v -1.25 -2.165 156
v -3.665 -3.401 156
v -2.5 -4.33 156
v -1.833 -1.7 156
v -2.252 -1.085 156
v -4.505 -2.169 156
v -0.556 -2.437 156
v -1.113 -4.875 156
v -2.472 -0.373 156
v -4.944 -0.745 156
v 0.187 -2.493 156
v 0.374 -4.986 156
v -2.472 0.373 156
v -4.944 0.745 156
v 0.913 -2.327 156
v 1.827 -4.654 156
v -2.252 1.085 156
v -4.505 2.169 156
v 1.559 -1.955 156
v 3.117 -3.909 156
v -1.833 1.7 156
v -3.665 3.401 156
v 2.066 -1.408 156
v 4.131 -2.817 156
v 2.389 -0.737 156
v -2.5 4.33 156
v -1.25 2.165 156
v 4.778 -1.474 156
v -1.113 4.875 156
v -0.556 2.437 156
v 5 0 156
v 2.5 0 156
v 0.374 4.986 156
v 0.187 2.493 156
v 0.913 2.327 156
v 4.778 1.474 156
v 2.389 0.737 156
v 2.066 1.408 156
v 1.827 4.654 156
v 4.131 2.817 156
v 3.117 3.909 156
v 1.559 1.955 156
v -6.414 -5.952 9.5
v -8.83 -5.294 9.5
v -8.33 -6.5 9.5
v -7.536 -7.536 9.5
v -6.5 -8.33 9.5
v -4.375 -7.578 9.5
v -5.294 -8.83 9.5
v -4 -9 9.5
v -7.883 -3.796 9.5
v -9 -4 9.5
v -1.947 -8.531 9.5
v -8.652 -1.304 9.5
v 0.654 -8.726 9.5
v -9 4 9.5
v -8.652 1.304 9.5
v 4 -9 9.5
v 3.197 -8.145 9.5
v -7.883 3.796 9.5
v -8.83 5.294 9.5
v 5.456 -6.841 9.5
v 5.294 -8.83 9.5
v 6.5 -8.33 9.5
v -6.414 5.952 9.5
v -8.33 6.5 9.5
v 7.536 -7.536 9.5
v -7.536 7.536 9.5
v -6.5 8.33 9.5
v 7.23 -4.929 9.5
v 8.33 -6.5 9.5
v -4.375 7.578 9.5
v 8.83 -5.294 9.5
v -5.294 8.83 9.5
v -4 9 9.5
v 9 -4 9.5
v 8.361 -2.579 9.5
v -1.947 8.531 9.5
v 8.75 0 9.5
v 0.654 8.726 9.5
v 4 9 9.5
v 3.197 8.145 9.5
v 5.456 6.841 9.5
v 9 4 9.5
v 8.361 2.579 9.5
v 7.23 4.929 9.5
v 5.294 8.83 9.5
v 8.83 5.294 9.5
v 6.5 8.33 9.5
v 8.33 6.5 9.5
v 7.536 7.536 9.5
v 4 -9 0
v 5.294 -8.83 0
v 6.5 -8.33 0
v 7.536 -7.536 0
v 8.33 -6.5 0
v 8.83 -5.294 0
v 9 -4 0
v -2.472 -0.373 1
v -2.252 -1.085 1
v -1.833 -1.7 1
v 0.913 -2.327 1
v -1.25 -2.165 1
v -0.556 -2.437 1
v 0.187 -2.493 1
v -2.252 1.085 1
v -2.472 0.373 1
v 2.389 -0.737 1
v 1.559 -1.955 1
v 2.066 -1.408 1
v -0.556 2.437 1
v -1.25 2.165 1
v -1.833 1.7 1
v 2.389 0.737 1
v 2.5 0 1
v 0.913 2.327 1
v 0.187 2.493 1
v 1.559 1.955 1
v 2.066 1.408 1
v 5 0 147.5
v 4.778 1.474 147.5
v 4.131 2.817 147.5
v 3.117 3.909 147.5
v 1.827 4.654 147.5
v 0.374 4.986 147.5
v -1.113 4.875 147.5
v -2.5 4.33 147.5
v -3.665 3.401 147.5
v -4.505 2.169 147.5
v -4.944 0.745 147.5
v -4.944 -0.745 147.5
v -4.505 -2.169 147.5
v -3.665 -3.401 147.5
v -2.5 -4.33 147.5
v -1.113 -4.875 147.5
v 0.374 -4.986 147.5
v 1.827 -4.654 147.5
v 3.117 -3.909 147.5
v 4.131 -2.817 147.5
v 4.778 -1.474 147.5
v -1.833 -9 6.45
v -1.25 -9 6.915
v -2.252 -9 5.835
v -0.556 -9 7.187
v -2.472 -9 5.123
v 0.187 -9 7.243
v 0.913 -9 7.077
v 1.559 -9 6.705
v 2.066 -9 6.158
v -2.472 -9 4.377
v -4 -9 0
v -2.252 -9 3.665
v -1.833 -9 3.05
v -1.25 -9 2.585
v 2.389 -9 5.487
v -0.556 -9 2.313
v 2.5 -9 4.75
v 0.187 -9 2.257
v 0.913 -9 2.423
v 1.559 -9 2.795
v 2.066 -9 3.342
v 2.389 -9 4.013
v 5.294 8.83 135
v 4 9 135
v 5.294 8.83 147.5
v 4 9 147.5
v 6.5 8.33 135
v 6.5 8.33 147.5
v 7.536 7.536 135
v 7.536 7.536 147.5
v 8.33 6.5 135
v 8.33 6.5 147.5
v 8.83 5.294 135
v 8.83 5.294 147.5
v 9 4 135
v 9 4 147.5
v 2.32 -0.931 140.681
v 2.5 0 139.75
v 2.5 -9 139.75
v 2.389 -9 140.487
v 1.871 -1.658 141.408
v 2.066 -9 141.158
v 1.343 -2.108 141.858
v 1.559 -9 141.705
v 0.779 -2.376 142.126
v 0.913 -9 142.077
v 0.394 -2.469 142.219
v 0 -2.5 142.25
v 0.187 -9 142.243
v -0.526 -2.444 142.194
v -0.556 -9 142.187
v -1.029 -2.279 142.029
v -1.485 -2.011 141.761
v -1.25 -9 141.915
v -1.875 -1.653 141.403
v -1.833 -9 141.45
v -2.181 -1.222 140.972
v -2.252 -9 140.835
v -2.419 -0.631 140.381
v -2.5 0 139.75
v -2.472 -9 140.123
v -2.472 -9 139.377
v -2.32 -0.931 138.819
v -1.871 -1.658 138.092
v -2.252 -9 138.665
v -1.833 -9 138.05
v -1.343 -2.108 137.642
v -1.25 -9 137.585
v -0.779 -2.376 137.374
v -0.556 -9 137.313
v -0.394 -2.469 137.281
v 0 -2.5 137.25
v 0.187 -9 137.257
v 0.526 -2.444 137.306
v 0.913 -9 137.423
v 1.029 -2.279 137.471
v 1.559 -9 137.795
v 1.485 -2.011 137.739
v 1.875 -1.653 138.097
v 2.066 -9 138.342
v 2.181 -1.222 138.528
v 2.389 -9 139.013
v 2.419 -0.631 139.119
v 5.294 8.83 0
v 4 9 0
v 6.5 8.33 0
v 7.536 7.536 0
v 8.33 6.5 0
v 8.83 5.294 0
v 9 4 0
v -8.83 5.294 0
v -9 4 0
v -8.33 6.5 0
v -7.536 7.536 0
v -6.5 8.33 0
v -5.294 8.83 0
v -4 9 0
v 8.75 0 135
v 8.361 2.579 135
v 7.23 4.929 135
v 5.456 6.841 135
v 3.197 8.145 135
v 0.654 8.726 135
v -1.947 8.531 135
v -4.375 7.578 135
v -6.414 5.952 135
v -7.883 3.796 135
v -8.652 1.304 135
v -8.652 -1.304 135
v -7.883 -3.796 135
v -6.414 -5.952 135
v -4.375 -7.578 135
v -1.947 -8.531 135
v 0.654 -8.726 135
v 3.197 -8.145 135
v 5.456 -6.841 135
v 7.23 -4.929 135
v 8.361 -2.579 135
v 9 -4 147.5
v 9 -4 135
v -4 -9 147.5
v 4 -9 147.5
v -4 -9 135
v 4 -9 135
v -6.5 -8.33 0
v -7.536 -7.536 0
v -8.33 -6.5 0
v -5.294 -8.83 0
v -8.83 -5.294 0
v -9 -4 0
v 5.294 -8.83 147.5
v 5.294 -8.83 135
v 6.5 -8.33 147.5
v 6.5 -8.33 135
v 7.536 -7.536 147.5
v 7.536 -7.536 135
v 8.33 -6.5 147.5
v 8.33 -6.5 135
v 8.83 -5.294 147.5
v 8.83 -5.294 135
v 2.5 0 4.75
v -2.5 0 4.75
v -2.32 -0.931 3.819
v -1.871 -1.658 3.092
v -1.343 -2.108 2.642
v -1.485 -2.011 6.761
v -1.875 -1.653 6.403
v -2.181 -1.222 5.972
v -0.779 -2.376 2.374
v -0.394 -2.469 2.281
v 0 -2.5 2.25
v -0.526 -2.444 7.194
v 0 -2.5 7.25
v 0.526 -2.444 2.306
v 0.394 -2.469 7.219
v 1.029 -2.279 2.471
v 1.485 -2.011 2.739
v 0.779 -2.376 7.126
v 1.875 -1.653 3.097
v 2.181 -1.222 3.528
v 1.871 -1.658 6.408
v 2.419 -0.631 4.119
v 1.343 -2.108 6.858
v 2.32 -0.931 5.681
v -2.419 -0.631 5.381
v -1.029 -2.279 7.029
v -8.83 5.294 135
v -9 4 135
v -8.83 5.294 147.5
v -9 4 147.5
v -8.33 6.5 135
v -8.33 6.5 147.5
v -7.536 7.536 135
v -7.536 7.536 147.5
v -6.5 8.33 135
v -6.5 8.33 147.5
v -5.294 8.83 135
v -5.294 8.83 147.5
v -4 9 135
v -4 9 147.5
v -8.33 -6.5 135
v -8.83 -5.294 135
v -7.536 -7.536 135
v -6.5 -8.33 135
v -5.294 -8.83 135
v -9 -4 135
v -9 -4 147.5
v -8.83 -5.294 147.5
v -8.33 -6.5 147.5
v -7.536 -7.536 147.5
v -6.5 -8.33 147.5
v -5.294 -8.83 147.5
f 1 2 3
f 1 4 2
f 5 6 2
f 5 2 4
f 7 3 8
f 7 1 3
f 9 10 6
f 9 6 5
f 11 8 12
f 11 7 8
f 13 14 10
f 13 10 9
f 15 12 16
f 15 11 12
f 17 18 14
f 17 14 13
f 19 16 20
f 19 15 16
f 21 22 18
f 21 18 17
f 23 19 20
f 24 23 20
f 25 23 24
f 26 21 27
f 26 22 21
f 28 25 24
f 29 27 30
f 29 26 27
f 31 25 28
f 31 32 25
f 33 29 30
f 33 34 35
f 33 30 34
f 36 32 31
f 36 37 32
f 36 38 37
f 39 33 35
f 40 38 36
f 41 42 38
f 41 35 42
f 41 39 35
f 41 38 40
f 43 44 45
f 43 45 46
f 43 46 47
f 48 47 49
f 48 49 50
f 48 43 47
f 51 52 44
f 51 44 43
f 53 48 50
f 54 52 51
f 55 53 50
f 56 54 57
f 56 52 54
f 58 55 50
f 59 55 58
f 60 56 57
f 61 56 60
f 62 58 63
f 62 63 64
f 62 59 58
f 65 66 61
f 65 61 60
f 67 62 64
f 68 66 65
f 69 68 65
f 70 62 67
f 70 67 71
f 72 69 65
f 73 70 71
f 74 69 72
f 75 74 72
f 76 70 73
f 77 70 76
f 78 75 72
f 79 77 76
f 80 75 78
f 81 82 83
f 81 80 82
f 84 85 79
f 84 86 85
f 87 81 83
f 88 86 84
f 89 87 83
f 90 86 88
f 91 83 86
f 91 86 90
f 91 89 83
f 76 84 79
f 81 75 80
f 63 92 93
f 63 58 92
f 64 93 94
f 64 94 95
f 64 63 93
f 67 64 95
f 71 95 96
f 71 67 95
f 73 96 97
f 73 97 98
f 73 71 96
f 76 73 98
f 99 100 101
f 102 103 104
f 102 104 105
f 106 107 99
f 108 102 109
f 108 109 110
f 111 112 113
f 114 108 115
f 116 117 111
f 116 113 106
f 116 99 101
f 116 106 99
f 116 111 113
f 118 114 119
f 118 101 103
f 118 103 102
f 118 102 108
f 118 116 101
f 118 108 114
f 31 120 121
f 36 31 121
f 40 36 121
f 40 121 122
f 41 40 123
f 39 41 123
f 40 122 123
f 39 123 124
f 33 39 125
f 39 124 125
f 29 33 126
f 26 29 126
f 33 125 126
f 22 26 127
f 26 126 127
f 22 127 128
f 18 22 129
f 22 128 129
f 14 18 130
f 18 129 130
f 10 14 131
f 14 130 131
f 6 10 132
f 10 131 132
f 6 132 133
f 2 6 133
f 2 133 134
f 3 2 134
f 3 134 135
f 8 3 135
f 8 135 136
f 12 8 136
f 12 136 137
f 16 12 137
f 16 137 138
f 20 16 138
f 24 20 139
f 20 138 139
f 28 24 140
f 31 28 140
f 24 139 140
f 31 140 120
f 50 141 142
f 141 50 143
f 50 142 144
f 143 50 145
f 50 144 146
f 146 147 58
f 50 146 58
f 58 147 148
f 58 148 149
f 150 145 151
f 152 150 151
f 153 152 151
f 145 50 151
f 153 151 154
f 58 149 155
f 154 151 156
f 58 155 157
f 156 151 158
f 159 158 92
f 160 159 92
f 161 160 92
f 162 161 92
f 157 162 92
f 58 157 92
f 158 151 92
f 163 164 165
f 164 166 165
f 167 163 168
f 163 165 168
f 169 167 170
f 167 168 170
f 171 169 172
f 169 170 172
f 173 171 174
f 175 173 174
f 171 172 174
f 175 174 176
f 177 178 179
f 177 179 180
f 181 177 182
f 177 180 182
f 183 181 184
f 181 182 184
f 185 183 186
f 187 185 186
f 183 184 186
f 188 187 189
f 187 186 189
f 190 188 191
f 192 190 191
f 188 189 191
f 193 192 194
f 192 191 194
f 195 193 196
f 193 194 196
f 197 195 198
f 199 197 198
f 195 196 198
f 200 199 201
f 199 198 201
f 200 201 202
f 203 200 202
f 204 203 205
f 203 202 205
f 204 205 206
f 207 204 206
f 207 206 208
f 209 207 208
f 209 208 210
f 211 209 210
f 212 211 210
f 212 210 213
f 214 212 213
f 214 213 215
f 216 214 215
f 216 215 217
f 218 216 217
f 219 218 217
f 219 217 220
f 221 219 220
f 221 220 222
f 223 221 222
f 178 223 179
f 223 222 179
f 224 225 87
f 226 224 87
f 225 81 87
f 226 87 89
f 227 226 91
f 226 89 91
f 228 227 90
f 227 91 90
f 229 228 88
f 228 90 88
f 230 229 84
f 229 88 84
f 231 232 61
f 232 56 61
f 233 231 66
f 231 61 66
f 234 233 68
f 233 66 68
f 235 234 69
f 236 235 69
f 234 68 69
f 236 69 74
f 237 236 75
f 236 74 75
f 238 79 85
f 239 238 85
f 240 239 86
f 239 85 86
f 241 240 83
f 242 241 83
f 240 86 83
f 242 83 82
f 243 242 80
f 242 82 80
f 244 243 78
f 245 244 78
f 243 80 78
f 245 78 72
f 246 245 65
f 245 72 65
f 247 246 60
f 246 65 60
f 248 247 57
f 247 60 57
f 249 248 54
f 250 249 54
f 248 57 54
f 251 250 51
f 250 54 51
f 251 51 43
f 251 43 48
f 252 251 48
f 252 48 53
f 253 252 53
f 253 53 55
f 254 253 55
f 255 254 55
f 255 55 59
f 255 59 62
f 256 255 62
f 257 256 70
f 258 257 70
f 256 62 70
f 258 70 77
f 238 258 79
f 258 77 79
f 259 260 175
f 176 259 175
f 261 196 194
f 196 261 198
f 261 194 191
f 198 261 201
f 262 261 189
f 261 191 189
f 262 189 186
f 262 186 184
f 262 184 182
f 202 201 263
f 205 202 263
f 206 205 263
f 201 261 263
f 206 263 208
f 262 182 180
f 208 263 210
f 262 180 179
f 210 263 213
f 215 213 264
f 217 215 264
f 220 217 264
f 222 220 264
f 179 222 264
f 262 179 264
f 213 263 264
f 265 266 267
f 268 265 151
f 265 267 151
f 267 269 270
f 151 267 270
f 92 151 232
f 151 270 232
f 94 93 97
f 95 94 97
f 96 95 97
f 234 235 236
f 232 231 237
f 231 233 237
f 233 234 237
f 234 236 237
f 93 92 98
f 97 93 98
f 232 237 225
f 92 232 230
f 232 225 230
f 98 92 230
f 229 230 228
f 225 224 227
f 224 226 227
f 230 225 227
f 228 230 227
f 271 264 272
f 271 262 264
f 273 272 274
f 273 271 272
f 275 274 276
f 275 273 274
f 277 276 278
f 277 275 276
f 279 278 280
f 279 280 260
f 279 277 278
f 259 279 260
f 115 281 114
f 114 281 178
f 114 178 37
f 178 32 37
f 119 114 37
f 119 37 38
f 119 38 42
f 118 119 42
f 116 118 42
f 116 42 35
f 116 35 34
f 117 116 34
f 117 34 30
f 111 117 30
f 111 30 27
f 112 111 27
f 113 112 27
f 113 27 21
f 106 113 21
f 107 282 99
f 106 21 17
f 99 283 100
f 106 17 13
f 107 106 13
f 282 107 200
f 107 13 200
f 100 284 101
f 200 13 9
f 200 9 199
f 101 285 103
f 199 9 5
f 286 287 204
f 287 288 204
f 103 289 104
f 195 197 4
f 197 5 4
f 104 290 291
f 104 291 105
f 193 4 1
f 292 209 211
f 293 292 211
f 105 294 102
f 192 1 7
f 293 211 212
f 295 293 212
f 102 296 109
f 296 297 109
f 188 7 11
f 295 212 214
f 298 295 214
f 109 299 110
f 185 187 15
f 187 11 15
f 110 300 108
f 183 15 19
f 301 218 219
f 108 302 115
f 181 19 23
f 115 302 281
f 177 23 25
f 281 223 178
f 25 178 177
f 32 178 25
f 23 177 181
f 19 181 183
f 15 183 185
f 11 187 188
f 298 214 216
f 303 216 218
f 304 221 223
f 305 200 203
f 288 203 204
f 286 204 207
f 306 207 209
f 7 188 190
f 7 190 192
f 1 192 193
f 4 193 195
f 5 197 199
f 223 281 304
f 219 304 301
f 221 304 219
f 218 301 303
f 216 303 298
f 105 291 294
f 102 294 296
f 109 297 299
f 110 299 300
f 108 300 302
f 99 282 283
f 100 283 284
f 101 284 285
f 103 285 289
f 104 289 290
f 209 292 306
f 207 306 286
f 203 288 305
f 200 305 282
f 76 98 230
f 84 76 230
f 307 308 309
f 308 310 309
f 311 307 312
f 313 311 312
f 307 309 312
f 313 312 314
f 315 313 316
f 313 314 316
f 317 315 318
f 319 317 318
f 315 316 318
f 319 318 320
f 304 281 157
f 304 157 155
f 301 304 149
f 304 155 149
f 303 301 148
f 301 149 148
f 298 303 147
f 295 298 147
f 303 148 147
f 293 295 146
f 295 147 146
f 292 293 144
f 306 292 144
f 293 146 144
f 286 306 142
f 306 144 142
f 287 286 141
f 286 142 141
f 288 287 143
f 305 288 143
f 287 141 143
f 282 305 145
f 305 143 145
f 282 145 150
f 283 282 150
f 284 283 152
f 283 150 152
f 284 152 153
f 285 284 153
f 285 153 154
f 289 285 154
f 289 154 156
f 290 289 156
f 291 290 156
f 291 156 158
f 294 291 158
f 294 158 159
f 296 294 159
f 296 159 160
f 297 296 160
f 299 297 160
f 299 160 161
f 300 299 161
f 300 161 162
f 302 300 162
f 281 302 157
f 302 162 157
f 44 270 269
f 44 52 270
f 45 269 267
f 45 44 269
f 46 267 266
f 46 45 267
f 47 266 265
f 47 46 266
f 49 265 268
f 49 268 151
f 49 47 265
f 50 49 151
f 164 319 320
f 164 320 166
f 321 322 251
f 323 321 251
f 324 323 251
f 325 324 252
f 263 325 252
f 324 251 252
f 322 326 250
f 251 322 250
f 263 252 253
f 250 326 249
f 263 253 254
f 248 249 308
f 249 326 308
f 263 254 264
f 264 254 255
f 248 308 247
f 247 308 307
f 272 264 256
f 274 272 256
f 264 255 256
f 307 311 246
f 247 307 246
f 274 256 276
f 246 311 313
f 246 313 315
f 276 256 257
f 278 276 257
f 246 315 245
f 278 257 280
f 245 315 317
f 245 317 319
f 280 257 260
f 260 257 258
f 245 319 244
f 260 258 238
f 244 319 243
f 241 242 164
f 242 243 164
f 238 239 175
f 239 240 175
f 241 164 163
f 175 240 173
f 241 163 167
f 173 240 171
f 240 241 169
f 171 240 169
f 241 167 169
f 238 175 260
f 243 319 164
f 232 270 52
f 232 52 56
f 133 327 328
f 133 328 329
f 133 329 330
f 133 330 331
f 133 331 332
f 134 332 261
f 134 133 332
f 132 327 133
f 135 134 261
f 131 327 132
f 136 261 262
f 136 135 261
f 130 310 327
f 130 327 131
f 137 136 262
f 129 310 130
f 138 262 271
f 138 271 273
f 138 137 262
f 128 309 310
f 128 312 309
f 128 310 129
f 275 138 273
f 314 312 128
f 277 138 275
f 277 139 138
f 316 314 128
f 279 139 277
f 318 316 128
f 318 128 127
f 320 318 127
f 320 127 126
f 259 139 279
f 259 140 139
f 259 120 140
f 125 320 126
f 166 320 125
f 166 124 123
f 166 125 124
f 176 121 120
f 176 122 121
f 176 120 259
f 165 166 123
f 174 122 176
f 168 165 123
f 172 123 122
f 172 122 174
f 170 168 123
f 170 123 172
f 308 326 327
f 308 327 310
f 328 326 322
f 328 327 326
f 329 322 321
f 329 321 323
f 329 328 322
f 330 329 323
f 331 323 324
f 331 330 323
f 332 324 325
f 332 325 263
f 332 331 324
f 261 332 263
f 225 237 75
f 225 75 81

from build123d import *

# Parameters (mm, degrees)
SKETCH_1_W          = 18
SKETCH_1_H          = 18
EXTRUDE_1_DEPTH     = 9.5
SKETCH_2_R          = 8.75
EXTRUDE_2_DEPTH     = 125.5
SKETCH_3_W          = 18
SKETCH_3_H          = 18
EXTRUDE_3_DEPTH     = 12.5
SKETCH_4_R          = 5
EXTRUDE_4_DEPTH     = 8.5
SKETCH_5_R          = 2.5
CUT_EXTRUDE_1_DEPTH = 155
FILLET_1_R          = 5
CUT_EXTRUDE_2_REACH = 20
SKETCH_6_R          = 2.5


with BuildPart() as part:
    # 草图1 → 凸台-拉伸1 (new body)
    with BuildSketch(Plane.XY):
        Rectangle(SKETCH_1_W, SKETCH_1_H)
    extrude(amount=EXTRUDE_1_DEPTH)

    # 草图2 → 凸台-拉伸2 (add)
    with BuildSketch(Plane.XY.offset(9.5)):
        Circle(SKETCH_2_R)
    extrude(amount=EXTRUDE_2_DEPTH)

    # 草图3 → 凸台-拉伸3 (add)
    with BuildSketch(Plane.XY.offset(135)):
        Rectangle(SKETCH_3_W, SKETCH_3_H)
    extrude(amount=EXTRUDE_3_DEPTH)

    # 草图4 → 凸台-拉伸4 (add)
    with BuildSketch(Plane.XY.offset(147.5)):
        Circle(SKETCH_4_R)
    extrude(amount=EXTRUDE_4_DEPTH)

    # 草图5 → 切除-拉伸1 (cut)
    with BuildSketch(Plane.XY.offset(156)):
        Circle(SKETCH_5_R)
    extrude(amount=-CUT_EXTRUDE_1_DEPTH, mode=Mode.SUBTRACT)

    # 圆角1
    fillet_1_edges = [part.edges().sort_by_distance(p)[0] for p in [
        (9, -9, 141.25),
        (9, 9, 141.25),
        (-9, 9, 141.25),
        (-9, -9, 141.25),
        (9, -9, 4.75),
        (-9, -9, 4.75),
        (-9, 9, 4.75),
        (9, 9, 4.75),
    ]]
    fillet(fillet_1_edges, radius=FILLET_1_R)

    # 草图6 → 切除-拉伸2 (cut, up to next)
    with BuildSketch(Plane.XZ.offset(9), mode=Mode.PRIVATE) as cut_extrude_2_sk1:
        with Locations((0, 4.75)):
            Circle(SKETCH_6_R)
    cut_extrude_2_tool1 = extrude(cut_extrude_2_sk1.sketch, amount=-CUT_EXTRUDE_2_REACH, mode=Mode.PRIVATE) & part.part
    add(cut_extrude_2_tool1.solids().sort_by_distance((0, -9, 4.75))[0], mode=Mode.SUBTRACT)
    # 草图6 → 切除-拉伸2 (cut, up to next)
    with BuildSketch(Plane.XZ.offset(9), mode=Mode.PRIVATE) as cut_extrude_2_sk2:
        with Locations((0, 139.75)):
            Circle(SKETCH_6_R)
    cut_extrude_2_tool2 = extrude(cut_extrude_2_sk2.sketch, amount=-CUT_EXTRUDE_2_REACH, mode=Mode.PRIVATE) & part.part
    add(cut_extrude_2_tool2.solids().sort_by_distance((0, -9, 139.75))[0], mode=Mode.SUBTRACT)


solid = part.part
